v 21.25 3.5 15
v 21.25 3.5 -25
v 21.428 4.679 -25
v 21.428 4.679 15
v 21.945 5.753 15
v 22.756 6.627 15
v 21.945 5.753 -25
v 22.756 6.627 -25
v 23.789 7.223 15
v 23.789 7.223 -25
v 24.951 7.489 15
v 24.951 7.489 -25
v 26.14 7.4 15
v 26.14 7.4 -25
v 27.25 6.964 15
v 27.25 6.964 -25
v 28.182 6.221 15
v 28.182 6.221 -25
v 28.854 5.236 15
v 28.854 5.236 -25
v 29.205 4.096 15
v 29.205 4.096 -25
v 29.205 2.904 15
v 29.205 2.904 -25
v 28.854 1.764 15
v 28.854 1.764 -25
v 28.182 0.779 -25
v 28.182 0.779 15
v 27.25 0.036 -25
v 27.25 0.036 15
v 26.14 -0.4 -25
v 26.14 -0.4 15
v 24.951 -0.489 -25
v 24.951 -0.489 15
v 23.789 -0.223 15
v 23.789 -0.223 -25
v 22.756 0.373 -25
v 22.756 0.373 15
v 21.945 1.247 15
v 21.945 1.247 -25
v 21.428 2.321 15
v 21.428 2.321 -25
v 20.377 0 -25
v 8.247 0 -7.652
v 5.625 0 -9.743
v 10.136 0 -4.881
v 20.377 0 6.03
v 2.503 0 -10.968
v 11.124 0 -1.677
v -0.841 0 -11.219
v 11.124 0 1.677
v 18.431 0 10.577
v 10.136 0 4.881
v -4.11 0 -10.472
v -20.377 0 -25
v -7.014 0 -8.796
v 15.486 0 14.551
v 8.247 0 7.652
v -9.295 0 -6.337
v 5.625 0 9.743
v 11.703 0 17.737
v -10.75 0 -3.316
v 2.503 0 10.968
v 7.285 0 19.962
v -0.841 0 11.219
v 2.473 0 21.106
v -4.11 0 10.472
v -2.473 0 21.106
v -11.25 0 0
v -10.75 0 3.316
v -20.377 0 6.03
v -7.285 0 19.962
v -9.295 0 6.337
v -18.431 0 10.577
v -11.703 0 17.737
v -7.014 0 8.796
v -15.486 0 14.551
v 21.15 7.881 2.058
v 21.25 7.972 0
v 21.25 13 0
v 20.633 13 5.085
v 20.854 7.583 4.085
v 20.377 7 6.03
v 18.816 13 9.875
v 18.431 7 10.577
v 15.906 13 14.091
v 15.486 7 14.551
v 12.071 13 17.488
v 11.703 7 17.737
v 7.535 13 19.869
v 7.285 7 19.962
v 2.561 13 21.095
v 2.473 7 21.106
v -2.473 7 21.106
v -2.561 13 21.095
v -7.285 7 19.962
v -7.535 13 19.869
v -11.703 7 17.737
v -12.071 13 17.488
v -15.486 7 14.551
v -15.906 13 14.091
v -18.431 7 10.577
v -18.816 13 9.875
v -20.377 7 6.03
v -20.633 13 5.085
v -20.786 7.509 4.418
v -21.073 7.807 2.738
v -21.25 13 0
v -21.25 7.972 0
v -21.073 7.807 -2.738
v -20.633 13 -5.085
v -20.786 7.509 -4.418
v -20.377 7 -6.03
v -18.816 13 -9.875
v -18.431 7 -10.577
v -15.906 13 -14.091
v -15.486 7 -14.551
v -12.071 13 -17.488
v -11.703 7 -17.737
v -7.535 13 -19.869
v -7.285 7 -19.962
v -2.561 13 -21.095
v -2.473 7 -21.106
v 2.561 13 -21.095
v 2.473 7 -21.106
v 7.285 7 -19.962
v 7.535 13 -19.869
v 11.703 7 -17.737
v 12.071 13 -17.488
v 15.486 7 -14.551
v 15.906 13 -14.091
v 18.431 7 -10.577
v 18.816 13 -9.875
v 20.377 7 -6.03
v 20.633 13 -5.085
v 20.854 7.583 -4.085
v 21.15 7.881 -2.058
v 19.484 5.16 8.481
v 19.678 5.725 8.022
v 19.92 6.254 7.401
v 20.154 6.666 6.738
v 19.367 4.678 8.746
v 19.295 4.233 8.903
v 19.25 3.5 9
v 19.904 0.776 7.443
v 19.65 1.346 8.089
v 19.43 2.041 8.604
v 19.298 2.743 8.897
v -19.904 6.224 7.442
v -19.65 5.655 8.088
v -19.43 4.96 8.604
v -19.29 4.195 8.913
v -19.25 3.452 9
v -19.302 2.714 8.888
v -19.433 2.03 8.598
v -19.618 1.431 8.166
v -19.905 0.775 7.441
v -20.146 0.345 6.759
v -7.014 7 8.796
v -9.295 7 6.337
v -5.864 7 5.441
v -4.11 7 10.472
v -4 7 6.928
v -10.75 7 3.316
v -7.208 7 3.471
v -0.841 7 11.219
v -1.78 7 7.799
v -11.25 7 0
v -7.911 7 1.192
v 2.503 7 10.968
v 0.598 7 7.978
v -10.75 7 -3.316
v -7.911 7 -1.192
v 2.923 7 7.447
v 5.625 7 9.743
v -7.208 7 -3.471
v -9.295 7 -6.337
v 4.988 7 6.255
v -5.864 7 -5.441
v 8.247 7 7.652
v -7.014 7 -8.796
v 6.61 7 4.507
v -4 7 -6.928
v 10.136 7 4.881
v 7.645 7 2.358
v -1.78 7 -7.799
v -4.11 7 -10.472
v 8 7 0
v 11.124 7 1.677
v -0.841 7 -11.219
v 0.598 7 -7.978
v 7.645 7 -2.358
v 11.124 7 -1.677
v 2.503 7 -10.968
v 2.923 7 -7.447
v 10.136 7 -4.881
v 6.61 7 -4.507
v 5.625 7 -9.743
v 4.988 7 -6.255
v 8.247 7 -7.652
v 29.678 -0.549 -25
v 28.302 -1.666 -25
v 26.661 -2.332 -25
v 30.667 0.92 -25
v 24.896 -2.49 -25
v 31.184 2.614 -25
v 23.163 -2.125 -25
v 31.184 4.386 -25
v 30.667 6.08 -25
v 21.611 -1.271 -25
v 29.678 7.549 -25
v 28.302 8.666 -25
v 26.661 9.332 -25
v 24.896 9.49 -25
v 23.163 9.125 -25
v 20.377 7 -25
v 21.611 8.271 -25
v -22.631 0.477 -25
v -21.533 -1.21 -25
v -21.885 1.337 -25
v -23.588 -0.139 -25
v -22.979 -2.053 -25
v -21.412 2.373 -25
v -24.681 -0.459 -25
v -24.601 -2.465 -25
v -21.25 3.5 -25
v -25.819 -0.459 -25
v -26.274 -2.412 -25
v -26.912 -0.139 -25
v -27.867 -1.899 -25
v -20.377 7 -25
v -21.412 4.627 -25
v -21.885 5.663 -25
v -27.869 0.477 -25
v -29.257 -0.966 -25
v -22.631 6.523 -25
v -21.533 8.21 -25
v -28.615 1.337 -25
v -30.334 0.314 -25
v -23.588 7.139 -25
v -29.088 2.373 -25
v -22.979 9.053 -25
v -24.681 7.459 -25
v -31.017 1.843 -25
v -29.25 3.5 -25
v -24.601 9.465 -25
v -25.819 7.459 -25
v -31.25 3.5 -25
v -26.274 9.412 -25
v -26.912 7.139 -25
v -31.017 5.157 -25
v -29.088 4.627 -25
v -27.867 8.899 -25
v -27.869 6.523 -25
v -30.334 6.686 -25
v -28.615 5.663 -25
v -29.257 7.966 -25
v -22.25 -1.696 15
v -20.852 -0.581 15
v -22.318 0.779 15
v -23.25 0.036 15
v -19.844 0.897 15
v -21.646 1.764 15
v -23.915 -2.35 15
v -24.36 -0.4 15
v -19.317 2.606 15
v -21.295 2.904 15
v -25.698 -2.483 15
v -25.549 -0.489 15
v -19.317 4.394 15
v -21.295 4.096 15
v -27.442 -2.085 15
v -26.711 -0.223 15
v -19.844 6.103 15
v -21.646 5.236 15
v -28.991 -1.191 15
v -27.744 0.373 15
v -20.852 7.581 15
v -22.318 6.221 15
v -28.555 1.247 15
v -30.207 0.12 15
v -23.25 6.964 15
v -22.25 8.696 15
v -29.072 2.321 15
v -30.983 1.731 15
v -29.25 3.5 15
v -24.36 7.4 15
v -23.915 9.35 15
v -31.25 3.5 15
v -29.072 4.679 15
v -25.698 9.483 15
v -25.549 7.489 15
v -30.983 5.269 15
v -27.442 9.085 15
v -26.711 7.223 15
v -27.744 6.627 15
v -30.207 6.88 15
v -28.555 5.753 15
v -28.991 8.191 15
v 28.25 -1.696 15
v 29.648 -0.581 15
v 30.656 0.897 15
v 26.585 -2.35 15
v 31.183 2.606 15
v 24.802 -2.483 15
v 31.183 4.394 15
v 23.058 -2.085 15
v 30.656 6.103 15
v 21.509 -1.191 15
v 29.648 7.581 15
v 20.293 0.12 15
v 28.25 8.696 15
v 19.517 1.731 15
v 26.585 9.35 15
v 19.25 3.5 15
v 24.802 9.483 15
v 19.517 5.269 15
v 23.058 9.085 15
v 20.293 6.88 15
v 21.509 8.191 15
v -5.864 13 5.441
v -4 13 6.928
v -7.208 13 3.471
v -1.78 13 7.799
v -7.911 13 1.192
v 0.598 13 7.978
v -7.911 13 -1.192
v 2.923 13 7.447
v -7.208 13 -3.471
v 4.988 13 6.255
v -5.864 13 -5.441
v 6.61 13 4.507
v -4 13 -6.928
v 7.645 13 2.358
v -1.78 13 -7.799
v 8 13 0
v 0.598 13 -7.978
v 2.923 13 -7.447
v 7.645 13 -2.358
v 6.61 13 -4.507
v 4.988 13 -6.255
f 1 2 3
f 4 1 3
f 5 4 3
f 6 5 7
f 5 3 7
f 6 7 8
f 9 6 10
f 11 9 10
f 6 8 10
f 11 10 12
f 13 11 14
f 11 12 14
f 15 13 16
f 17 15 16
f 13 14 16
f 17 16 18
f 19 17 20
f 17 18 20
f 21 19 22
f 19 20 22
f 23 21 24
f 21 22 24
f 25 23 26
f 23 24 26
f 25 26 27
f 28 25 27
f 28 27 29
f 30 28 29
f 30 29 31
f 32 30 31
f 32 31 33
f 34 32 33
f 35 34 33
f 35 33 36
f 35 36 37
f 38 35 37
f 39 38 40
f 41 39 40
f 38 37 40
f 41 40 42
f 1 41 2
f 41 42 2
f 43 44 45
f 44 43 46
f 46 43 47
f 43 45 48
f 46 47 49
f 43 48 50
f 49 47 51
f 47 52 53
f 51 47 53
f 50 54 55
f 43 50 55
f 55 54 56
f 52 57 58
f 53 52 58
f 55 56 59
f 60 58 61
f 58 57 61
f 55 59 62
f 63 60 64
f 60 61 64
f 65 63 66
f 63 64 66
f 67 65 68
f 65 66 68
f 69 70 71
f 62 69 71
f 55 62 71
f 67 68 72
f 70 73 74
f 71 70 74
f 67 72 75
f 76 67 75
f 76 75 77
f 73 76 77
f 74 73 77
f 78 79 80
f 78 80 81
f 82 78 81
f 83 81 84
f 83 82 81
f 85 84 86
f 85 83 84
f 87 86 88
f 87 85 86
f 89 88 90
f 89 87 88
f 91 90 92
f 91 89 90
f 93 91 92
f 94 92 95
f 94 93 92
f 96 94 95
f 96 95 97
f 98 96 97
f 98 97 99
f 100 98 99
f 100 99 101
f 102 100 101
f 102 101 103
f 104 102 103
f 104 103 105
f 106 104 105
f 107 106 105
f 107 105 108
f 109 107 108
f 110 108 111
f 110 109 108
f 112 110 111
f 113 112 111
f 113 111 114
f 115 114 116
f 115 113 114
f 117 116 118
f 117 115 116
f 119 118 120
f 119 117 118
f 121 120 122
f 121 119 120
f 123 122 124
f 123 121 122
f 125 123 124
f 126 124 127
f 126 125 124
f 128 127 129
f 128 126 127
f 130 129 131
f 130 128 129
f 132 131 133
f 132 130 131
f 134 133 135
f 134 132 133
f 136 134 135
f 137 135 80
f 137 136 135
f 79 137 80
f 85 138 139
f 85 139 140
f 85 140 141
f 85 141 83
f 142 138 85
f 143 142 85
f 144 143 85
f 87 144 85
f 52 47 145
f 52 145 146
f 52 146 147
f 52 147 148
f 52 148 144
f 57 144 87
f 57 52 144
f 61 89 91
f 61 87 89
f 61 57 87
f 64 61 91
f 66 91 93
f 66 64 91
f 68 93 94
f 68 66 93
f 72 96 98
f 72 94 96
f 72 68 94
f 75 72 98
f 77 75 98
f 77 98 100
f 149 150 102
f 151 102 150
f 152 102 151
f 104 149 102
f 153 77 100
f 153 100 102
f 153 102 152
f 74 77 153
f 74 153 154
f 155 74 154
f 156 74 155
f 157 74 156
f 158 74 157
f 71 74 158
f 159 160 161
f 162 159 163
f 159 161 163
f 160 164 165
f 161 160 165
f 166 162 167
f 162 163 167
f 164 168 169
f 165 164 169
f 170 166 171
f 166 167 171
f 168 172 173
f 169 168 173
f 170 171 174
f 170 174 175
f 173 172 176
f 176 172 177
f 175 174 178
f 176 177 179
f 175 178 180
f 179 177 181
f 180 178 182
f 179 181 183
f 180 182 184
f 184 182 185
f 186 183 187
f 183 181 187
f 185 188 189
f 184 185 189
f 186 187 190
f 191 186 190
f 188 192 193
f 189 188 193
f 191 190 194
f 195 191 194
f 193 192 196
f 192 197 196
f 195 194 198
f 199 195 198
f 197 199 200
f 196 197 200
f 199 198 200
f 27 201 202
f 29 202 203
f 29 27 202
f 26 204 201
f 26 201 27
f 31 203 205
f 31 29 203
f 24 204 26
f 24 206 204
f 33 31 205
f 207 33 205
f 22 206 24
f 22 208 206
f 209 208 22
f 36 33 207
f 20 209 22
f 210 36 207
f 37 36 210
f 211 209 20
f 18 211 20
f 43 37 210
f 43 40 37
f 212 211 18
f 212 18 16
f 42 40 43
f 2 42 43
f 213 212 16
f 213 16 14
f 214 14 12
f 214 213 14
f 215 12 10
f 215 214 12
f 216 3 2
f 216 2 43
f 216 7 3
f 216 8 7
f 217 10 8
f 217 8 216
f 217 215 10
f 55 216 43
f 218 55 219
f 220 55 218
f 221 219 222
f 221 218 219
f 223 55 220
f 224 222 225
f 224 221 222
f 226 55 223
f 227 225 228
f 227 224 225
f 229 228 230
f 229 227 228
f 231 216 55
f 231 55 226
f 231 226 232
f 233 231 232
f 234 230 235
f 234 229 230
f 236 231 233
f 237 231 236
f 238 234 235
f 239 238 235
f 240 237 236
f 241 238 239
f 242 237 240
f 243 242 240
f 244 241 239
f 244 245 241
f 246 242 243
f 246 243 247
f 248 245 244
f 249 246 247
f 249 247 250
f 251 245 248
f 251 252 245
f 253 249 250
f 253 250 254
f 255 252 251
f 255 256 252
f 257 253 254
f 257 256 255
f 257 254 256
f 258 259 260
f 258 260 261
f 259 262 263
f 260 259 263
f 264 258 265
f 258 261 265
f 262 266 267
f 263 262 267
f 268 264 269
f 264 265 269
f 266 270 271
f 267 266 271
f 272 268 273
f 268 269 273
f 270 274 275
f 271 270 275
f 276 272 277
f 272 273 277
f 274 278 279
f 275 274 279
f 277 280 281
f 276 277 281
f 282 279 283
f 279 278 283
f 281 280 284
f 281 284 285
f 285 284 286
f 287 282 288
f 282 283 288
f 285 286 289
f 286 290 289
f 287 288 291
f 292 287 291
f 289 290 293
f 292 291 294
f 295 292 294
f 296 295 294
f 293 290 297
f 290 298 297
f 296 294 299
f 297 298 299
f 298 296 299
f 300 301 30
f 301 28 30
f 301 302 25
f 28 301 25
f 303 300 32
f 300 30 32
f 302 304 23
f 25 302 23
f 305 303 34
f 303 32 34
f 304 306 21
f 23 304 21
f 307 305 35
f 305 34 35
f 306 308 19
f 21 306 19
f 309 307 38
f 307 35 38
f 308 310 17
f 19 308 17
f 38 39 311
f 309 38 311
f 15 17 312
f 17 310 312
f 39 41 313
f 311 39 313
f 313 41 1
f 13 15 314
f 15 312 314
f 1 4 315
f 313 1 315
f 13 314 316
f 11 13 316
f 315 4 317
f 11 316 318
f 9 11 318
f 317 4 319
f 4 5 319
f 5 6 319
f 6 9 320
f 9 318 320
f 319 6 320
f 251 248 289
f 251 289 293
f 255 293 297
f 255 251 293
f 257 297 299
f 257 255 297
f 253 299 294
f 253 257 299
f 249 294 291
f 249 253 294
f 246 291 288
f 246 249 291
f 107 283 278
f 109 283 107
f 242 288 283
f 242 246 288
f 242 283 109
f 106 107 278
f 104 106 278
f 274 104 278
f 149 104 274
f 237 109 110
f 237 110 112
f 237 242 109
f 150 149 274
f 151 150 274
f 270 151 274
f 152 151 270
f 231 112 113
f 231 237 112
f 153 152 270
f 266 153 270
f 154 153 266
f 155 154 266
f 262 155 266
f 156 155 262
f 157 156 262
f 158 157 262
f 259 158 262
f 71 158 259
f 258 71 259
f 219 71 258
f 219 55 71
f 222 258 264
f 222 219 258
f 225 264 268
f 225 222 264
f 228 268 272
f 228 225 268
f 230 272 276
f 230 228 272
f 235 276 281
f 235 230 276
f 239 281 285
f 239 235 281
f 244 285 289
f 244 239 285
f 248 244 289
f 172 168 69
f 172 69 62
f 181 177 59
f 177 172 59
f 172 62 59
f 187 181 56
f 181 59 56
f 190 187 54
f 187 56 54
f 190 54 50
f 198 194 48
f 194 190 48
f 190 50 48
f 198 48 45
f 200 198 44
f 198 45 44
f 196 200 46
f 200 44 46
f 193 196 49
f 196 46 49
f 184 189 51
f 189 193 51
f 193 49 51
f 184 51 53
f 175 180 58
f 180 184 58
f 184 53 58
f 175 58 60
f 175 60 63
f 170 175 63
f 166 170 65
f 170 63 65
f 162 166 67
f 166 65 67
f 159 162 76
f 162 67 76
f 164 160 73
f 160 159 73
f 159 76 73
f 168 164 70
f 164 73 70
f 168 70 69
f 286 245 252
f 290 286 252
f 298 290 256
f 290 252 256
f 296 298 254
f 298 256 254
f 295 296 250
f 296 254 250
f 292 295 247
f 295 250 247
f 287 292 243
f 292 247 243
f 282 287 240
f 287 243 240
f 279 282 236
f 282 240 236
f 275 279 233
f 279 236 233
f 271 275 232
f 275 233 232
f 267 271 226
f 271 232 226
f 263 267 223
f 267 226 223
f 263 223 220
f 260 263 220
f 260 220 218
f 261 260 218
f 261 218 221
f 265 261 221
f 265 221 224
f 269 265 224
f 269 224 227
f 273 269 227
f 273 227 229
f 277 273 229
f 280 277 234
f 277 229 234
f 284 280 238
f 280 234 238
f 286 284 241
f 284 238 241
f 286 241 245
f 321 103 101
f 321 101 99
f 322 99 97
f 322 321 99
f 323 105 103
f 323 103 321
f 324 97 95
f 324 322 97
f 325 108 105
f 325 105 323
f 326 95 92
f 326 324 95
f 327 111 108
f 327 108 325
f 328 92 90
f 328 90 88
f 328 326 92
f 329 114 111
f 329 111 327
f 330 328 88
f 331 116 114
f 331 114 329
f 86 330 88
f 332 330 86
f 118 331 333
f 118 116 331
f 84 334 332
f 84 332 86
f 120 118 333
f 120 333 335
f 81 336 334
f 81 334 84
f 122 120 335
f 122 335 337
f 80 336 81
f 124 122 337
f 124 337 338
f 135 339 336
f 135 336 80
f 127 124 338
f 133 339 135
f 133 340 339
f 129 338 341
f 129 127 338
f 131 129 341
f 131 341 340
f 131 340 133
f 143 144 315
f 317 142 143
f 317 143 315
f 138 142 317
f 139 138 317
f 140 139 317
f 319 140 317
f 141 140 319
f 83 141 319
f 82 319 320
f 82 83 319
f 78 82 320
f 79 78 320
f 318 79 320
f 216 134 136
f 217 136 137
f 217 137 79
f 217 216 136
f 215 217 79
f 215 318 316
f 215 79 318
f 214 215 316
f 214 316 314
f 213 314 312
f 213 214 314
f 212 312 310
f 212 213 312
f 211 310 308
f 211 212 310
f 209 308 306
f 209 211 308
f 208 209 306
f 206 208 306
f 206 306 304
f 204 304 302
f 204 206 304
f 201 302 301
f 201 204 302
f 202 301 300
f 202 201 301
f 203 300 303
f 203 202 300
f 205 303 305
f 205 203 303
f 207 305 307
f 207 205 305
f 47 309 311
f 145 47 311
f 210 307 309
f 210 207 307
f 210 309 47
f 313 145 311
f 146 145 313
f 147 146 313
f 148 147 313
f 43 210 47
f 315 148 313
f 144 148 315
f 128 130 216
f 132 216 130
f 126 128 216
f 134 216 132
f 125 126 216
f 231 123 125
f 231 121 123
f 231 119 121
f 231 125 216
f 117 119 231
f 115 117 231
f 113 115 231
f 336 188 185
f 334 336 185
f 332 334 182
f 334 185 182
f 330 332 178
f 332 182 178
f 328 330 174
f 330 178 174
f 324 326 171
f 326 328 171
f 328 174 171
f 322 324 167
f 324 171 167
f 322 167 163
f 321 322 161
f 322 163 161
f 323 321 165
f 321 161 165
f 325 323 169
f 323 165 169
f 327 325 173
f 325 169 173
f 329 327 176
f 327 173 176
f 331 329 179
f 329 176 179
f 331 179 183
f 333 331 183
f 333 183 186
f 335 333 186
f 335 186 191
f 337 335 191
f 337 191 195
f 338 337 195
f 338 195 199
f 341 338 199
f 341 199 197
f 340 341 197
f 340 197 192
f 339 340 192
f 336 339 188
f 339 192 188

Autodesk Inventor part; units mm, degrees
ref_plane "YZ Plane" through (0, 0, 0) normal (1, 0, 0) x (0, 1, 0)
ref_plane "XZ Plane" through (0, 0, 0) normal (0, 1, 0) x (-1, 0, 0)
ref_plane "XY Plane" through (0, 0, 0) normal (0, 0, 1) x (1, 0, 0)
sketch "Sketch1" plane through (0, 0, 0) normal (0, 1, 0) x (-1, 0, 0)
  circle A0 centre (0, 0) radius 11.25
  arc A1 (21.25, 0) -> (-21.25, 0) centre (0, 0) ccw
  line L0 (0, -140) -> (21.25, -140)
  line L1 (21.25, -140) -> (-21.25, -140)
  line L2 (-21.25, -140) -> (-21.25, 0)
  line L3 (21.25, -140) -> (21.25, 0)
  dimension "d0" = 22.5
extrude "Extrusion1" add sketch "Sketch1" along normal blind 7
sketch "Sketch2" plane through (0, 7, 0) normal (0, 1, 0) x (1, 0, 0)
  circle A0 centre (0, 0) radius 11.25 projected
  circle A1 centre (0, 0) radius 21.25
  circle A2 centre (0, 0) radius 8
  dimension "d5" = 16
extrude "Extrusion2" add sketch "Sketch2" along normal blind 6 contours A0 | A1
sketch "Sketch3" plane through (0, 7, 0) normal (0, 1, 0) x (1, 0, 0)
  point P0 (0, 0)
sketch "Sketch4" plane through (21.25, 0, -140) normal (0, 0, -1) x (-1, 0, 0)
  line L0 (0, 0) -> (42.5, 0) projected
  line L1 (42.5, 0) -> (42.5, 7) projected
  line L2 (0, 7) -> (42.5, 7) projected
  line L3 (0, 0) -> (0, 7) projected
  point P0 (21.25, 0)
extrude "Extrusion3" cut sketch "Sketch4" against normal blind 115
sketch "Sketch5" plane through (21.25, 0, -25) normal (0, 0, -1) x (-1, 0, 0)
  line L0 (0, 0) -> (0, 7) projected
  line L1 (0, 3.5) -> (-4, 3.5)
  circle A0 centre (-4, 3.5) radius 4
  circle A1 centre (-4, 3.5) radius 6
  line L2 (42.5, 0) -> (42.5, 7) projected
  line L3 (42.5, 3.5) -> (46.5, 3.5)
  circle A2 centre (46.5, 3.5) radius 4
  circle A3 centre (46.5, 3.5) radius 6
  point P0 (21.25, 0)
  dimension "d10" = 4
  dimension "d11" = 8
  dimension "d12" = 12
  dimension "d13" = 4
  dimension "d14" = 12
extrude "Extrusion4" add sketch "Sketch5" against normal blind 40
properties part number "wheel_stabilizer"
